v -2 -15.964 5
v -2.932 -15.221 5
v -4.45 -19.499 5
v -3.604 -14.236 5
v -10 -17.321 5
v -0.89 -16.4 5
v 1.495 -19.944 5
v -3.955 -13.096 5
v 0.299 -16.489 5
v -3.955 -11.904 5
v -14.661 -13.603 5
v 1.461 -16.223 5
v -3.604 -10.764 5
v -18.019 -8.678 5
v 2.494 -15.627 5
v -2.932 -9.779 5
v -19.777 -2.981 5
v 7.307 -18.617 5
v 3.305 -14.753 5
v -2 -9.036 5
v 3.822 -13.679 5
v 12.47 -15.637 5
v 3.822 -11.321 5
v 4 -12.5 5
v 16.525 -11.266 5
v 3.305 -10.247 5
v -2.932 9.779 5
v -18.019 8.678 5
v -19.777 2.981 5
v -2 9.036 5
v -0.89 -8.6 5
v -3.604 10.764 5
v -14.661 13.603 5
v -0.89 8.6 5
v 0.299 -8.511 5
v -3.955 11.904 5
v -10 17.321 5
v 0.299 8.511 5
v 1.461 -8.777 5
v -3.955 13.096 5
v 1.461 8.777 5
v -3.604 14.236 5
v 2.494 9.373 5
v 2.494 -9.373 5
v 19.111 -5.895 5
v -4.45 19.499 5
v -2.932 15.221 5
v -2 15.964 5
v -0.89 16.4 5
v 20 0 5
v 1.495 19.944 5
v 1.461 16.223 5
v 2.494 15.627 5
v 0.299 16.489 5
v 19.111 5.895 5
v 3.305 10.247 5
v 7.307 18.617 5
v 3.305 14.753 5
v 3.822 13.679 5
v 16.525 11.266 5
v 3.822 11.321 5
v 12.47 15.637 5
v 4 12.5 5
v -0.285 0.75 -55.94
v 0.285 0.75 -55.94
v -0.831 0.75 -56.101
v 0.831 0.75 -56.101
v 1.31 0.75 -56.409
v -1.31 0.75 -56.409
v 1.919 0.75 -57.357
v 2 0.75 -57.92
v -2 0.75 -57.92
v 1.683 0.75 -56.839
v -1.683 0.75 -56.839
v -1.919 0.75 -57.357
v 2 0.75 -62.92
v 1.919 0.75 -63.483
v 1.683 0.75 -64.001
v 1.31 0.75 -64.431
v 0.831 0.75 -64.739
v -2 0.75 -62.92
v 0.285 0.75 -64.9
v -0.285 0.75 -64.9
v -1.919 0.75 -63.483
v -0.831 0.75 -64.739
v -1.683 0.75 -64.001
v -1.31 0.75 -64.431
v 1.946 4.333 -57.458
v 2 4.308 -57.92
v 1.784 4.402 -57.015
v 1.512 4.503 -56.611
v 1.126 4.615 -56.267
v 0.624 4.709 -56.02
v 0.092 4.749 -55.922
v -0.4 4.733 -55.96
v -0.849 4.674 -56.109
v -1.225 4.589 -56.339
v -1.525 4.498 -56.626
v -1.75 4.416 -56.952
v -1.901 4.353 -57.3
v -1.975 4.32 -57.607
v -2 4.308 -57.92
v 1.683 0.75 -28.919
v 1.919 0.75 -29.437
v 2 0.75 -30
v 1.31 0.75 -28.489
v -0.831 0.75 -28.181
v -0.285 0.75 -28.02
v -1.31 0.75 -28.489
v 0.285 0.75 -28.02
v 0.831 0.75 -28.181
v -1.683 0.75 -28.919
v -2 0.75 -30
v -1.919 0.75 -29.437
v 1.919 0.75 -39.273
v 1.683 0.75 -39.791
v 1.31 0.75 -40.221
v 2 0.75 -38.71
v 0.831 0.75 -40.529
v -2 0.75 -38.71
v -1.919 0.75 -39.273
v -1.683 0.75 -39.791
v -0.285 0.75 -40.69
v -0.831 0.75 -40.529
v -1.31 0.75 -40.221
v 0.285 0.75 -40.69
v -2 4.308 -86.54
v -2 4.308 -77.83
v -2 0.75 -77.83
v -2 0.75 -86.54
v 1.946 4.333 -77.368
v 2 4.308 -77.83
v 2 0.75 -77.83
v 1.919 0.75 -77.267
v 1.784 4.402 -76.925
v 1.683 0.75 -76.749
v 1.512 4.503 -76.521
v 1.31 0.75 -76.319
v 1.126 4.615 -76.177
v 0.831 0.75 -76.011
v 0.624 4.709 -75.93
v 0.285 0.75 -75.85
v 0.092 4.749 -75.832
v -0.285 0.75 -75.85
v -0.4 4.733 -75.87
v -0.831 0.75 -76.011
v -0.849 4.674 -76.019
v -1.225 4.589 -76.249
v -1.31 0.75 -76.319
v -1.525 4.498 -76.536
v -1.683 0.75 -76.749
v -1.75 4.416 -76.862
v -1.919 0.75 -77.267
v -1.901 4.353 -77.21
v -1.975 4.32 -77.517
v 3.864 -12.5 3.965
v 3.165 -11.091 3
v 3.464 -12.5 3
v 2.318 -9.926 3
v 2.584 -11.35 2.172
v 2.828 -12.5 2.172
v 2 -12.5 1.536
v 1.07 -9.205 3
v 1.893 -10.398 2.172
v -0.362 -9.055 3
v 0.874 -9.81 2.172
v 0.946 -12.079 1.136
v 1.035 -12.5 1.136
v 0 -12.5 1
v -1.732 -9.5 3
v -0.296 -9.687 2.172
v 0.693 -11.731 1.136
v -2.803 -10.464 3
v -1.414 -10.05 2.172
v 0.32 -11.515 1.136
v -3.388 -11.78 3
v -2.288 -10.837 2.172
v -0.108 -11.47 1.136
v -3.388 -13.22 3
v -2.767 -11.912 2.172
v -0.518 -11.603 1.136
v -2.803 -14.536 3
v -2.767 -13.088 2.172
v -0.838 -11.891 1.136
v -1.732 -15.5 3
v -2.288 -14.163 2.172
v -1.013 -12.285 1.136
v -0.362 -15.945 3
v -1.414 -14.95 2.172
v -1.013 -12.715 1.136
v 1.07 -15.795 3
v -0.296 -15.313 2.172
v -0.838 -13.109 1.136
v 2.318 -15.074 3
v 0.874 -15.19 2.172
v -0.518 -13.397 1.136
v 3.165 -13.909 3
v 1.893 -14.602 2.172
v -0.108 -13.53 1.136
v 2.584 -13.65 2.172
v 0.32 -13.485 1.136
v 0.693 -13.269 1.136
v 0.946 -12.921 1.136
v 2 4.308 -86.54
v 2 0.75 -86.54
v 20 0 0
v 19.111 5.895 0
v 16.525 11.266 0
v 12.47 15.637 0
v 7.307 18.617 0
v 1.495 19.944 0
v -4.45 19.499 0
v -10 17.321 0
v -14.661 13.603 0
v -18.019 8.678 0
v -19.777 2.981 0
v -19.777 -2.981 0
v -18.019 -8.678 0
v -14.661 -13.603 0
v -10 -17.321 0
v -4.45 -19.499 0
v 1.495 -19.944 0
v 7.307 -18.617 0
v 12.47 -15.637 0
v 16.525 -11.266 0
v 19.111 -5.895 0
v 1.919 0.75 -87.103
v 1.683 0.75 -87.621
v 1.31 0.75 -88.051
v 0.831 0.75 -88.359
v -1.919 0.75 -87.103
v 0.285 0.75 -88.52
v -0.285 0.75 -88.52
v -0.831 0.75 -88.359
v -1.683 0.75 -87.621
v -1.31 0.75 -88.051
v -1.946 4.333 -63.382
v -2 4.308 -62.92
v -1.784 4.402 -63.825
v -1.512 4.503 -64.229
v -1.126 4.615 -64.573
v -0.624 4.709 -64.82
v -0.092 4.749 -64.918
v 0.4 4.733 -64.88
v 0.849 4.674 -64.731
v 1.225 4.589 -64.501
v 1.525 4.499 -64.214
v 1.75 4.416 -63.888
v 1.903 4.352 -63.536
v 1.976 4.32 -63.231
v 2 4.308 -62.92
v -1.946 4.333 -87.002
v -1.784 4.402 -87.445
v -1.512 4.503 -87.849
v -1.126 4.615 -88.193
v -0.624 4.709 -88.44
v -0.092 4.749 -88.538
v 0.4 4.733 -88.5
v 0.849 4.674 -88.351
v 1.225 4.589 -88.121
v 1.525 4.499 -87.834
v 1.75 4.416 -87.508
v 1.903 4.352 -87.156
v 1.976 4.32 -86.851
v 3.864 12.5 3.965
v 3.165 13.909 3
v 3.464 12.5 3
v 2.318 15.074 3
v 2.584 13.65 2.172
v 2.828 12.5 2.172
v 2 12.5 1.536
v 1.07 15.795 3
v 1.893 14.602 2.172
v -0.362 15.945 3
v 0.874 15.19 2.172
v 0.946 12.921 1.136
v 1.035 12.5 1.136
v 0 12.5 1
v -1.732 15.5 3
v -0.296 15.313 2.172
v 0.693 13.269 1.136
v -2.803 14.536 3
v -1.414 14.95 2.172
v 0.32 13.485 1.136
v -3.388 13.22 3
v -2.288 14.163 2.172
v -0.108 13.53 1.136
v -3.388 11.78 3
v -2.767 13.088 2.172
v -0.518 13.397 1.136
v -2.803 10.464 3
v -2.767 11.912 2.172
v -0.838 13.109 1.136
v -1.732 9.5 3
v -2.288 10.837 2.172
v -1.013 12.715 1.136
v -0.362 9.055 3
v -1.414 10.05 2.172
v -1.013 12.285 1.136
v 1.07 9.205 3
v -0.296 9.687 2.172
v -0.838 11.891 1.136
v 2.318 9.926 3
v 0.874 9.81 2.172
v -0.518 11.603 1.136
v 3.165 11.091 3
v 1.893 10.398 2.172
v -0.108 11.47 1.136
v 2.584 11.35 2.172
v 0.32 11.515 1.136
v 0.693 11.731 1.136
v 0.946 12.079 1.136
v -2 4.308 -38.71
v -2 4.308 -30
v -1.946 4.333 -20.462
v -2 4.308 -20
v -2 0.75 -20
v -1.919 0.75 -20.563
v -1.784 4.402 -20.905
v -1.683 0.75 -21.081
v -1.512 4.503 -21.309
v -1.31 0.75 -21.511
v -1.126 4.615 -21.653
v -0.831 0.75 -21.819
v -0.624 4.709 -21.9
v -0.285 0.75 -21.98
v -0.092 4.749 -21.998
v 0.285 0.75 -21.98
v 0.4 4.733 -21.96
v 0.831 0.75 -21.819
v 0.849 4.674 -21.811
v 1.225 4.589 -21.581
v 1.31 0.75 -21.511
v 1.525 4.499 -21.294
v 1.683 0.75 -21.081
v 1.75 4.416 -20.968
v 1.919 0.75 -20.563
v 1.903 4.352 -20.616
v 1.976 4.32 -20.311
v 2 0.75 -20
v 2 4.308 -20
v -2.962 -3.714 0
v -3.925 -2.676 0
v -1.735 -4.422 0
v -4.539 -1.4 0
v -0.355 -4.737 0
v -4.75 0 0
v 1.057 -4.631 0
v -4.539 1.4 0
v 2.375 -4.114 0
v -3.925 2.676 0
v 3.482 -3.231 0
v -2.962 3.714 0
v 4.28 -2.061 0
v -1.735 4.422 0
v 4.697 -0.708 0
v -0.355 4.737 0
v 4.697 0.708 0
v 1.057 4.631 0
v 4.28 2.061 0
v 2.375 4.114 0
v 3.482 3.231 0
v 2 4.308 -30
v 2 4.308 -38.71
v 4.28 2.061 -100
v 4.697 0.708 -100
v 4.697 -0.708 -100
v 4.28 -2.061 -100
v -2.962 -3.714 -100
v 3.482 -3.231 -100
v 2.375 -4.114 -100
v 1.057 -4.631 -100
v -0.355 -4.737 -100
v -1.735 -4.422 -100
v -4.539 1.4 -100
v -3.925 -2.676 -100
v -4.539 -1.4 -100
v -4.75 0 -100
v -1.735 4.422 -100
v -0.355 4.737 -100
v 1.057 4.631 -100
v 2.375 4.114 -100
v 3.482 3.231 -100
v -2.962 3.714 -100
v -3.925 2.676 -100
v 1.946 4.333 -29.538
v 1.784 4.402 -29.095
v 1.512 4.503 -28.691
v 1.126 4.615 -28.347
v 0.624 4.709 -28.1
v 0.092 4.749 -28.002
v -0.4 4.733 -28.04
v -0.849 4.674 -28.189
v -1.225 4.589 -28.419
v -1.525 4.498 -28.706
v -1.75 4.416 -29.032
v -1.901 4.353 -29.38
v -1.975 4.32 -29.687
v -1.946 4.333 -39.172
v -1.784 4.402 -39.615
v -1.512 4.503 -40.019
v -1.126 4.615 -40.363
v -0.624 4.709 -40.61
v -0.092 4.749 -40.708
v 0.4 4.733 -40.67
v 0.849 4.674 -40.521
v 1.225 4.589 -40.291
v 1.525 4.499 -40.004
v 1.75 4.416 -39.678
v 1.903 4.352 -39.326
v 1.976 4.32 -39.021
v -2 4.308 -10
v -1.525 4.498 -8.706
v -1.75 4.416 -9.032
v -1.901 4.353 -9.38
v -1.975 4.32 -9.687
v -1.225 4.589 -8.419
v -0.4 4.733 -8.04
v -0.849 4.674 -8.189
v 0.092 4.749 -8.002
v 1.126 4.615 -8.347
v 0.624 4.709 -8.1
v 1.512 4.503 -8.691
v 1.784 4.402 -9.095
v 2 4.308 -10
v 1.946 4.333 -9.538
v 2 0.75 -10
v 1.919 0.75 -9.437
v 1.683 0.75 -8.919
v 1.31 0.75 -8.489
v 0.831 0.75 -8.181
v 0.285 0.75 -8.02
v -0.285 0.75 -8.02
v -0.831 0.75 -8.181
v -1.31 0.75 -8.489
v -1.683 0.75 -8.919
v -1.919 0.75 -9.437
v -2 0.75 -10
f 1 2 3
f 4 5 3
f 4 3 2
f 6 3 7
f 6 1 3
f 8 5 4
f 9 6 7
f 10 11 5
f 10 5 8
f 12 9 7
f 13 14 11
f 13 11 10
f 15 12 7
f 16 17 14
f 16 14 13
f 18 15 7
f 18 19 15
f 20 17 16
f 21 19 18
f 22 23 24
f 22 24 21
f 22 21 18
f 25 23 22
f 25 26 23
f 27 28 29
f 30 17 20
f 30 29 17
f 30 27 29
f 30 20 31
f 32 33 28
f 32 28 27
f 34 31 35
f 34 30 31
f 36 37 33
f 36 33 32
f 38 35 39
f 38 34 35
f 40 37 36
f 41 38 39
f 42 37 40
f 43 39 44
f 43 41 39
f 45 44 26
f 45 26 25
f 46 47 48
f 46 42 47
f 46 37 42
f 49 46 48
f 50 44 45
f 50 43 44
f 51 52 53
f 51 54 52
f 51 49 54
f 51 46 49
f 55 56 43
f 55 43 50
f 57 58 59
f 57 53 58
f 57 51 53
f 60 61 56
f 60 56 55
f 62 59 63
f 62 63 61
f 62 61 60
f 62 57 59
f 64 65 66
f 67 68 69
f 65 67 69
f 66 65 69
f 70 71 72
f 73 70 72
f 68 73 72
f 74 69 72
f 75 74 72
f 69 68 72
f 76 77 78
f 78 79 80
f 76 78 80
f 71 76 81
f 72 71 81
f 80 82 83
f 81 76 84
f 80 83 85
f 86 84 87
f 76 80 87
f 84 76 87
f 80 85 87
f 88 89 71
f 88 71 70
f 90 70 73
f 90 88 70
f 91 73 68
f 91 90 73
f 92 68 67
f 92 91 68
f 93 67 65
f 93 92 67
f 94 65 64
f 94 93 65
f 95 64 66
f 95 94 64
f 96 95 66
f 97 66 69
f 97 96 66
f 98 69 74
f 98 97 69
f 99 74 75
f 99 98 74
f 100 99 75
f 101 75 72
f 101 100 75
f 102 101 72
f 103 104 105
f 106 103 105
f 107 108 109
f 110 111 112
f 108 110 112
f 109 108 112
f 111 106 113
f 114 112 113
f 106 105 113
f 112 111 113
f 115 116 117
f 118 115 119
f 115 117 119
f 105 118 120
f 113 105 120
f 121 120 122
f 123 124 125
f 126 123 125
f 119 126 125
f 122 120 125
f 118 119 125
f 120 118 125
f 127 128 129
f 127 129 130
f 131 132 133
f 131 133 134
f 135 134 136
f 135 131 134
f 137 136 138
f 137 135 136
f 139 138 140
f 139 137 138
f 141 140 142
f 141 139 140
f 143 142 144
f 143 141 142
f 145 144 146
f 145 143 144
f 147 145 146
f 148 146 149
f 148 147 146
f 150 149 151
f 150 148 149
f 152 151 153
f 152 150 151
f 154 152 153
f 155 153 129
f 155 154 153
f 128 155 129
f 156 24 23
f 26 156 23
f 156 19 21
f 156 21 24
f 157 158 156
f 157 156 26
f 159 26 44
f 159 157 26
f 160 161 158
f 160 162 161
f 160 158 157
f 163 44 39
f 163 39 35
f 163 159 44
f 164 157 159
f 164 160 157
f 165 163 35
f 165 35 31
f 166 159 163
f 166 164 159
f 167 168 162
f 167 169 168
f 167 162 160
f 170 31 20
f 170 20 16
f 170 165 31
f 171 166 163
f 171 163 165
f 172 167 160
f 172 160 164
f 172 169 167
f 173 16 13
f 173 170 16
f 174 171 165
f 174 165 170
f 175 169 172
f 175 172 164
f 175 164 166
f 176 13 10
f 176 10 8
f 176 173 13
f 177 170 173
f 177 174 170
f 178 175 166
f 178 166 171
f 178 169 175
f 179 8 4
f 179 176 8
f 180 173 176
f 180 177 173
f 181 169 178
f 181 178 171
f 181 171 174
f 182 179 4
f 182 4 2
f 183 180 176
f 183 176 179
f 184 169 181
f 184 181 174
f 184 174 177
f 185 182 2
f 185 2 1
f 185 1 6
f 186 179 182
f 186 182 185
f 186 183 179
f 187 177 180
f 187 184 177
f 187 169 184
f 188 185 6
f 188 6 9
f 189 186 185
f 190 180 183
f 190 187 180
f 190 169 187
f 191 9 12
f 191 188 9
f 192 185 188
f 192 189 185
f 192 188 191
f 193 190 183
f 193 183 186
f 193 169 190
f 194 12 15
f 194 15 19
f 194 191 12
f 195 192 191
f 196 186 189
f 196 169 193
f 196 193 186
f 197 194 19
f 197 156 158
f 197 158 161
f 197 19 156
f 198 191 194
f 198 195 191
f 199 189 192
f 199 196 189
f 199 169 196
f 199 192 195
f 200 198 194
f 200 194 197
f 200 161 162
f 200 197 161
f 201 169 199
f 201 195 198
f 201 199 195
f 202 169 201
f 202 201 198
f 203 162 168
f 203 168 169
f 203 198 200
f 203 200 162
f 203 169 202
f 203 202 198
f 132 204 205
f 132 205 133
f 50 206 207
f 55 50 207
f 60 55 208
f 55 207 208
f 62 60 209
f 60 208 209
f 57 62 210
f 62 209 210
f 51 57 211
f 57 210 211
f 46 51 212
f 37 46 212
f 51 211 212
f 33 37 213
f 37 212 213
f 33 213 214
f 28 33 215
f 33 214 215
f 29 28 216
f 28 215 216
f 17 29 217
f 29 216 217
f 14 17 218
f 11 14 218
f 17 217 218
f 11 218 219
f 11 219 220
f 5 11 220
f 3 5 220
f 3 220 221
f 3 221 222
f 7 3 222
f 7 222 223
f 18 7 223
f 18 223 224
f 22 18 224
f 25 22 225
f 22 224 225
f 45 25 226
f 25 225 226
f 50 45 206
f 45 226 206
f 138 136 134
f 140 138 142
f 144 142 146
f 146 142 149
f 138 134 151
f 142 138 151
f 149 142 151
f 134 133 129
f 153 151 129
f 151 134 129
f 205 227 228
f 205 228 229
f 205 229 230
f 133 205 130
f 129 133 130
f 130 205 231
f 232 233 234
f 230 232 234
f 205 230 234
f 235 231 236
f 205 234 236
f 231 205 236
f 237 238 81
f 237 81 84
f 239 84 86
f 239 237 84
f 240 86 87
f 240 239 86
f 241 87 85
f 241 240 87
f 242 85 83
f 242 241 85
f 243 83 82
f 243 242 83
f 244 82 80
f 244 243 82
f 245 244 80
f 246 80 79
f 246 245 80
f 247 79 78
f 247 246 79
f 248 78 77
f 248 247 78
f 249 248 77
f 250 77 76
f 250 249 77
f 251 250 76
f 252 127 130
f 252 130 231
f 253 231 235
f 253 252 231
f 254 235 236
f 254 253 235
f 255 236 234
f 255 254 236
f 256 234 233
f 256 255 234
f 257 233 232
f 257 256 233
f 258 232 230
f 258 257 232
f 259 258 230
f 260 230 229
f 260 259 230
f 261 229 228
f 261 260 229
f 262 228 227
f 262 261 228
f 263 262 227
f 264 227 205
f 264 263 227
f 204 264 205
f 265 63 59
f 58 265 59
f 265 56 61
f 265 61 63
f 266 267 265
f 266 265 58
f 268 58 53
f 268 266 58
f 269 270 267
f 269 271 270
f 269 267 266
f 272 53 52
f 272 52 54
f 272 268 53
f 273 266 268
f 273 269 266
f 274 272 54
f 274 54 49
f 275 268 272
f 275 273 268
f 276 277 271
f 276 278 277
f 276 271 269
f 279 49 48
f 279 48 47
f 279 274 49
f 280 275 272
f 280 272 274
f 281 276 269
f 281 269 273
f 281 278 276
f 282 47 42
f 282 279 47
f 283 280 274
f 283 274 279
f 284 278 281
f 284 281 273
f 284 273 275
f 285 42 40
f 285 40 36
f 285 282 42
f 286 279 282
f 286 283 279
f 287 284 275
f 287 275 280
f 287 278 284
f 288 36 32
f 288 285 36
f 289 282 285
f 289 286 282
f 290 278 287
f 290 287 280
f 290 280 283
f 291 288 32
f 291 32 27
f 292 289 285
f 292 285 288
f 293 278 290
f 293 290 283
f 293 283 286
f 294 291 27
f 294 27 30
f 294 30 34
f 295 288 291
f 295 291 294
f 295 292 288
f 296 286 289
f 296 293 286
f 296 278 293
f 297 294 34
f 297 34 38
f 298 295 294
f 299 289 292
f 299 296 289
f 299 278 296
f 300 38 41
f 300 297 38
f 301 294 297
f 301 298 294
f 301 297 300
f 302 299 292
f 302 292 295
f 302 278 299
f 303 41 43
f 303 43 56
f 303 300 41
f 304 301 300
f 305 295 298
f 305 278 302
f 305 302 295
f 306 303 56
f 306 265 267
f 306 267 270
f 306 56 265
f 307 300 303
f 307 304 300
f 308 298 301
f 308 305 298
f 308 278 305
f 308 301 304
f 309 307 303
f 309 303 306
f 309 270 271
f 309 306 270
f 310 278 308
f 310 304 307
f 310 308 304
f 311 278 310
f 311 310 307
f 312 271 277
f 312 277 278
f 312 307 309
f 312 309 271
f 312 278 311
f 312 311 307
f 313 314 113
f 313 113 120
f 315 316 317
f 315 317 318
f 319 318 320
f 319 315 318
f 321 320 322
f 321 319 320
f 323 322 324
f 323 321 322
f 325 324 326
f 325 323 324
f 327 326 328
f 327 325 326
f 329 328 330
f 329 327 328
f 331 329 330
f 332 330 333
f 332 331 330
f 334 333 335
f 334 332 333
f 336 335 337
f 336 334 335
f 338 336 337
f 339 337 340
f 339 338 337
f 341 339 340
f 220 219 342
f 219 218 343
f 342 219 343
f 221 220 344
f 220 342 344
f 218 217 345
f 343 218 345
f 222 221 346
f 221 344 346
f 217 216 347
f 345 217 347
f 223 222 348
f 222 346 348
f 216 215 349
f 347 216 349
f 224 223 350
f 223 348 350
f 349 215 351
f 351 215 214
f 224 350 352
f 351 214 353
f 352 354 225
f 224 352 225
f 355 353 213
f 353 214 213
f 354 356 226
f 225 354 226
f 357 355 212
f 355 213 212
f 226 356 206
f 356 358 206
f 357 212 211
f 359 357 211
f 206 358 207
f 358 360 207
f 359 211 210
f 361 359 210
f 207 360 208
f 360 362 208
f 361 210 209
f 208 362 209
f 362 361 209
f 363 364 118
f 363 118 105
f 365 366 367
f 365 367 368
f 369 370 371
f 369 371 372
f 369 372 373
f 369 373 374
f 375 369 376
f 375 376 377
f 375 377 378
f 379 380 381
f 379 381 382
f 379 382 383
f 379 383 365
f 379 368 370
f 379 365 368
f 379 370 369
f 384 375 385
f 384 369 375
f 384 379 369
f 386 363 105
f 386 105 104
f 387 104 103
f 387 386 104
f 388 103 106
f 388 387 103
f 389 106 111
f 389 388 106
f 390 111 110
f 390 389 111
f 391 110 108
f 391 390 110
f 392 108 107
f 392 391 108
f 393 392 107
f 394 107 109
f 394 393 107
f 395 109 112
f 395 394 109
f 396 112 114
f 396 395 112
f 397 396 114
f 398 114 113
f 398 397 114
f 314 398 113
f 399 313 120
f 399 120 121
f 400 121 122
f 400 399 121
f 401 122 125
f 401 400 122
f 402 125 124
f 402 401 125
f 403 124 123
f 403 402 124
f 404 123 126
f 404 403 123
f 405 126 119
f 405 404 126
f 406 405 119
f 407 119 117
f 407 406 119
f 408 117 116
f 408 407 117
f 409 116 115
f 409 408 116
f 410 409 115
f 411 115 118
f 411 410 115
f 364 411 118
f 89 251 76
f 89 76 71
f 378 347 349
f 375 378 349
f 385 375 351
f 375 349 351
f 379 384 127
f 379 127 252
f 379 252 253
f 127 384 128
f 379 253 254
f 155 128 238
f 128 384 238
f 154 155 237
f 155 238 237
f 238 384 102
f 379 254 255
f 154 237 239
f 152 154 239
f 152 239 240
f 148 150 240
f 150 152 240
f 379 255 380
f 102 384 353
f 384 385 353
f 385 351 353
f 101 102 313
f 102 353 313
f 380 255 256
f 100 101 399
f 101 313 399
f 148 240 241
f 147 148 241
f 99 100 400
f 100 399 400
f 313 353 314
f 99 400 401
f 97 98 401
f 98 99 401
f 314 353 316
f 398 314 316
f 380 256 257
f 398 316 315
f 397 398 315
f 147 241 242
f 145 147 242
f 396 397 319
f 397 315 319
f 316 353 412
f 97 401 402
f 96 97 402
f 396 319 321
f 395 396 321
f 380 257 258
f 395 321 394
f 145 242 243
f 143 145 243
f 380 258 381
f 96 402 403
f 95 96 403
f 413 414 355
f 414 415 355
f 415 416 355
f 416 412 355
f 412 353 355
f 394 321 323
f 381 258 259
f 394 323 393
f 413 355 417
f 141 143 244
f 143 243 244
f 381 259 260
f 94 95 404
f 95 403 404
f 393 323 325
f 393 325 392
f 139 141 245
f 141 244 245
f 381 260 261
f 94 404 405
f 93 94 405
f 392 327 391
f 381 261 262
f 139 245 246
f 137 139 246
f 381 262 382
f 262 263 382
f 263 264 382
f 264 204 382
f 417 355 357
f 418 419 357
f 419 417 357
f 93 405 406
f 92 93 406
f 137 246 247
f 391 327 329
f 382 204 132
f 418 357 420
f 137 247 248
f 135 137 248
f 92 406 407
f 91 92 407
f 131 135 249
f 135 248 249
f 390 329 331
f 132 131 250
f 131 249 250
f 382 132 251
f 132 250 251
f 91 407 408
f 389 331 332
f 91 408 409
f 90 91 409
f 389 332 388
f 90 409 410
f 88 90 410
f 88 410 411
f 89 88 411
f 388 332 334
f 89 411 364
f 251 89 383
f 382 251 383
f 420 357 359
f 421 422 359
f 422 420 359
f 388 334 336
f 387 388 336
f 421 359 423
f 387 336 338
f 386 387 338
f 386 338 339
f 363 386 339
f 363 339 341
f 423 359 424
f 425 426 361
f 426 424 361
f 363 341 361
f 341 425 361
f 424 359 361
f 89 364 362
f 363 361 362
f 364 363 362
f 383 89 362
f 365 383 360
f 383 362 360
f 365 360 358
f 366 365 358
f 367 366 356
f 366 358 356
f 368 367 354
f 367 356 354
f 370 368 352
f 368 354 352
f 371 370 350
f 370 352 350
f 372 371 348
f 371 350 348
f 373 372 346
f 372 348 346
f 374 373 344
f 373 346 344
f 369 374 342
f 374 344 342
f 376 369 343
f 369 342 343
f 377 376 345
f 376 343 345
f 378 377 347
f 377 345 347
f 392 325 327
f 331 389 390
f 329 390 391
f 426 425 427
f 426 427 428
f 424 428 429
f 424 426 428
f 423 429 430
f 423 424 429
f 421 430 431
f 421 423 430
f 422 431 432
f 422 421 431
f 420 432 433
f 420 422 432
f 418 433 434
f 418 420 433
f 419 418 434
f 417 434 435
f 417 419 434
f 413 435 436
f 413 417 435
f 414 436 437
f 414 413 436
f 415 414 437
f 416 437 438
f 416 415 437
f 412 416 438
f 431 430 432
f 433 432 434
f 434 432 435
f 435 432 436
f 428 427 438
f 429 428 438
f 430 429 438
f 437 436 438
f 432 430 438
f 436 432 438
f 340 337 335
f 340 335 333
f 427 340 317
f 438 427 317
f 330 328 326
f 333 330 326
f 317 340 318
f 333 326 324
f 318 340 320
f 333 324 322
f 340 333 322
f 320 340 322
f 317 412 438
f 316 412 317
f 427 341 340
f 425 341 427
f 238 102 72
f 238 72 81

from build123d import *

# Parameters (mm, degrees)
SKETCH1_R           = 20
BOSS_EXTRUDE1_DEPTH = 5
SKETCH3_R           = 4
CUT_EXTRUDE2_DEPTH  = 4
FILLET2_R           = 4
SKETCH4_R           = 4.75
BOSS_EXTRUDE2_DEPTH = 105
CUT_EXTRUDE3_DEPTH  = 4
CUT_EXTRUDE4_START  = -5
SKETCH6_R           = 4.75
CUT_EXTRUDE4_DEPTH  = 5


with BuildPart() as part:
    # Sketch1 → Boss-Extrude1 (new body)
    with BuildSketch(Plane.XY):
        Circle(SKETCH1_R)
    extrude(amount=BOSS_EXTRUDE1_DEPTH)

    # Sketch3 → Cut-Extrude2 (cut)
    with BuildSketch(Plane.XY.offset(5)):
        with Locations((0, 12.5)):
            Circle(SKETCH3_R)
        with Locations((0, -12.5)):
            Circle(SKETCH3_R)
    extrude(amount=-CUT_EXTRUDE2_DEPTH, mode=Mode.SUBTRACT)

    # Fillet2
    fillet2_edges = [part.edges().sort_by_distance(p)[0] for p in [
        (-4, 12.5, 1),
        (-4, -12.5, 1),
    ]]
    fillet(fillet2_edges, radius=FILLET2_R - 0.0001)  # a hair under: the kernel refuses the full size

    # Sketch4 → Boss-Extrude2 (add)
    with BuildSketch(Plane(origin=(0, 0, 0), x_dir=(-1, 0, 0), z_dir=(0, 0, -1))):
        Circle(SKETCH4_R)
    extrude(amount=BOSS_EXTRUDE2_DEPTH)

    # Sketch5 → Cut-Extrude3 (cut)
    with BuildSketch(Plane(origin=(0, 4.75, 0), x_dir=(1, 0, 0), z_dir=(0, 1, 0))):
        with BuildLine():
            Line((-2, 10), (-2, 20))
            ThreePointArc((-2, 20), (0, 22), (2, 20))
            Line((2, 20), (2, 10))
            ThreePointArc((2, 10), (0, 8), (-2, 10))
        make_face()
        with BuildLine():
            Line((-2, 30), (-2, 38.71))
            ThreePointArc((-2, 38.71), (0, 40.71), (2, 38.71))
            Line((2, 38.71), (2, 30))
            ThreePointArc((2, 30), (0, 28), (-2, 30))
        make_face()
        with BuildLine():
            Line((-2, 77.83), (-2, 86.54))
            ThreePointArc((-2, 86.54), (0, 88.54), (2, 86.54))
            Line((2, 86.54), (2, 77.83))
            ThreePointArc((2, 77.83), (0, 75.83), (-2, 77.83))
        make_face()
        with BuildLine():
            Line((-2, 57.92), (-2, 62.92))
            ThreePointArc((-2, 62.92), (0, 64.92), (2, 62.92))
            Line((2, 62.92), (2, 57.92))
            ThreePointArc((2, 57.92), (0, 55.92), (-2, 57.92))
        make_face()
    extrude(amount=-CUT_EXTRUDE3_DEPTH, mode=Mode.SUBTRACT)

    # Sketch6 → Cut-Extrude4 (cut)
    with BuildSketch(Plane(origin=(0, 0, -105), x_dir=(-1, 0, 0), z_dir=(0, 0, -1)).offset(CUT_EXTRUDE4_START)):
        Circle(SKETCH6_R)
    extrude(amount=CUT_EXTRUDE4_DEPTH, mode=Mode.SUBTRACT)


solid = part.part
